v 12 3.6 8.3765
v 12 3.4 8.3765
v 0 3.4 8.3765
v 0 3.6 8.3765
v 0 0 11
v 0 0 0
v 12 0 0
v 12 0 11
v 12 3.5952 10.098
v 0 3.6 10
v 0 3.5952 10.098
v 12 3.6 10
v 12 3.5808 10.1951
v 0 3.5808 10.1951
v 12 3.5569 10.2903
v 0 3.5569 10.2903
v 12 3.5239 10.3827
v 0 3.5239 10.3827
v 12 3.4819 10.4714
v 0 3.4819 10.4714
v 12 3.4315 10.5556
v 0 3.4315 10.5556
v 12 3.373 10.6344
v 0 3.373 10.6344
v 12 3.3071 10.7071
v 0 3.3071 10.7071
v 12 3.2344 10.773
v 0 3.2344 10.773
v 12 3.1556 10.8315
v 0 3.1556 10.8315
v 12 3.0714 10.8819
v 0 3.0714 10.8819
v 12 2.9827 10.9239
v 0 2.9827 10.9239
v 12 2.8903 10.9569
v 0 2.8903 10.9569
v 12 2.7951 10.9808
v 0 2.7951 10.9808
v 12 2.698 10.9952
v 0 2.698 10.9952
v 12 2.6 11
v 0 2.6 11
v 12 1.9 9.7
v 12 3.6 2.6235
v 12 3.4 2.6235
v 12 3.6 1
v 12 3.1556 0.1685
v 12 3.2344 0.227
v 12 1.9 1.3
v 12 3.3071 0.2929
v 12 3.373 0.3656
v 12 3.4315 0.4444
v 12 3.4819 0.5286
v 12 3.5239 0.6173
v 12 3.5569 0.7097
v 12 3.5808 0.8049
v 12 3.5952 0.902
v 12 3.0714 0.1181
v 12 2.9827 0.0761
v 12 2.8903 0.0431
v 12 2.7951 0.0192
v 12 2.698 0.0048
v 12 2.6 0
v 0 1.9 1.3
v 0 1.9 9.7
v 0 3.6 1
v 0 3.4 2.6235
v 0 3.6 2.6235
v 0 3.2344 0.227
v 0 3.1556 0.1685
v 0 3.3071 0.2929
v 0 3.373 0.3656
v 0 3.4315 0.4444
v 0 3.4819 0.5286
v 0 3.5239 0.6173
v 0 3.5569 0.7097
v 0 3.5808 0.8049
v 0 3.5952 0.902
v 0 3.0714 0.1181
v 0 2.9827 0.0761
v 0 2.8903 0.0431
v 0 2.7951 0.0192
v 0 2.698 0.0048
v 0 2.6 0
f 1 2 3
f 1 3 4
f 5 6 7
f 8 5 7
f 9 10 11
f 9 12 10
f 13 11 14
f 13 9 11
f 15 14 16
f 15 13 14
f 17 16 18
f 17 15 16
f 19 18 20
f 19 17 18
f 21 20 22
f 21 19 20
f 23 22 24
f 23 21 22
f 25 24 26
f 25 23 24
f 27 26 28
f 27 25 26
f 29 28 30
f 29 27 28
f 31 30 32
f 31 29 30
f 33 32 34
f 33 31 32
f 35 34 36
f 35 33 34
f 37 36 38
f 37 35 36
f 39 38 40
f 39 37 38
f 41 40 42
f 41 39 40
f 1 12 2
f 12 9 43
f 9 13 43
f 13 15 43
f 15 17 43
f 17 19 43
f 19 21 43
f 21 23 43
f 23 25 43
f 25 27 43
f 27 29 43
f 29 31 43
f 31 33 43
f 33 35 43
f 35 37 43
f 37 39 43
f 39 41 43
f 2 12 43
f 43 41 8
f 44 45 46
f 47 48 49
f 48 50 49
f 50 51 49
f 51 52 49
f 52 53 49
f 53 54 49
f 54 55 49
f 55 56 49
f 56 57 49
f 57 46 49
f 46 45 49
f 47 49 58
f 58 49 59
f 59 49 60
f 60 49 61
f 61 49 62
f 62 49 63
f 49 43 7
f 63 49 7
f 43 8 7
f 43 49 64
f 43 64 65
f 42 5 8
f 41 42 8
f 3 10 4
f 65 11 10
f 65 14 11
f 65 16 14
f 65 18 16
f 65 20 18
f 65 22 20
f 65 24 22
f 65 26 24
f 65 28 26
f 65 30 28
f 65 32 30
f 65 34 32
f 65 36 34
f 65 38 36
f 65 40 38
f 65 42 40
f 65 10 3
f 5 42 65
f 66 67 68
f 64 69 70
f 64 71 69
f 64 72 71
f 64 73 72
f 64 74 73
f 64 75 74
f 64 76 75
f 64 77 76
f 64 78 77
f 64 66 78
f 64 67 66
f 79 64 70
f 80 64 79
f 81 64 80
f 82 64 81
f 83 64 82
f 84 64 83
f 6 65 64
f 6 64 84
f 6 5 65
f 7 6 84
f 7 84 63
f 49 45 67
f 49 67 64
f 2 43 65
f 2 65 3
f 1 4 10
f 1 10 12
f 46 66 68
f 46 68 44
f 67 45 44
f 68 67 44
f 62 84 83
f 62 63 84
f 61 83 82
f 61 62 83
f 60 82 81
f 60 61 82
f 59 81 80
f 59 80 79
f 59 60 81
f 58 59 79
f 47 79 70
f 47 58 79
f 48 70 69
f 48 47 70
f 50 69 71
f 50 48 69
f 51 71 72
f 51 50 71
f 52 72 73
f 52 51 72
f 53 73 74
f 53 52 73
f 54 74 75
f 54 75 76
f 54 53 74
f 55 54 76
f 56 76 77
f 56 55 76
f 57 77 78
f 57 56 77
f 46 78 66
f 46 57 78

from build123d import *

# Parameters (mm, degrees)
SKETCH1_W           = 12
SKETCH1_H           = 11
BOSS_EXTRUDE1_DEPTH = 1.6
SKETCH2_W           = 12
SKETCH2_H           = 11
BOSS_EXTRUDE2_DEPTH = 2
CUT_EXTRUDE1_DEPTH  = 17.672132437
CUT_EXTRUDE2_DEPTH  = 17.672132437
FILLET1_R           = 1


with BuildPart() as part:
    # Sketch1 → Boss-Extrude1 (new body)
    with BuildSketch(Plane(origin=(0, 0, 0), x_dir=(1, 0, 0), z_dir=(0, 1, 0))):
        with Locations((6, -5.5)):
            Rectangle(SKETCH1_W, SKETCH1_H)
    extrude(amount=BOSS_EXTRUDE1_DEPTH)

    # Sketch2 → Boss-Extrude2 (add)
    with BuildSketch(Plane(origin=(0, 1.6, 0), x_dir=(1, 0, 0), z_dir=(0, 1, 0))):
        with Locations((6, -5.5)):
            Rectangle(SKETCH2_W, SKETCH2_H)
    extrude(amount=BOSS_EXTRUDE2_DEPTH)

    # Sketch3 → Cut-Extrude1 (cut, through all)
    with BuildSketch(Plane(origin=(12, 0, 0), x_dir=(0, 0, -1), z_dir=(1, 0, 0))):
        Polygon((-9.7, 1.9), (-8.2, 3.6), (-2.8, 3.6), (-1.3, 1.9), align=None)
    extrude(amount=-CUT_EXTRUDE1_DEPTH, mode=Mode.SUBTRACT)

    # Sketch4 → Cut-Extrude2 (cut, through all)
    with BuildSketch(Plane(origin=(12, 0, 0), x_dir=(0, 0, -1), z_dir=(1, 0, 0))):
        Polygon((-8.376470588, 3.4), (-8.376470588, 3.6), (-8.2, 3.6), align=None)
        Polygon((-2.623529412, 3.4), (-2.623529412, 3.6), (-2.8, 3.6), align=None)
    extrude(amount=-CUT_EXTRUDE2_DEPTH, mode=Mode.SUBTRACT)

    # Fillet1
    fillet1_edges = [part.edges().sort_by_distance(p)[0] for p in [
        (6, 3.6, 11),
        (6, 3.6, 0),
    ]]
    fillet(fillet1_edges, radius=FILLET1_R)


solid = part.part
